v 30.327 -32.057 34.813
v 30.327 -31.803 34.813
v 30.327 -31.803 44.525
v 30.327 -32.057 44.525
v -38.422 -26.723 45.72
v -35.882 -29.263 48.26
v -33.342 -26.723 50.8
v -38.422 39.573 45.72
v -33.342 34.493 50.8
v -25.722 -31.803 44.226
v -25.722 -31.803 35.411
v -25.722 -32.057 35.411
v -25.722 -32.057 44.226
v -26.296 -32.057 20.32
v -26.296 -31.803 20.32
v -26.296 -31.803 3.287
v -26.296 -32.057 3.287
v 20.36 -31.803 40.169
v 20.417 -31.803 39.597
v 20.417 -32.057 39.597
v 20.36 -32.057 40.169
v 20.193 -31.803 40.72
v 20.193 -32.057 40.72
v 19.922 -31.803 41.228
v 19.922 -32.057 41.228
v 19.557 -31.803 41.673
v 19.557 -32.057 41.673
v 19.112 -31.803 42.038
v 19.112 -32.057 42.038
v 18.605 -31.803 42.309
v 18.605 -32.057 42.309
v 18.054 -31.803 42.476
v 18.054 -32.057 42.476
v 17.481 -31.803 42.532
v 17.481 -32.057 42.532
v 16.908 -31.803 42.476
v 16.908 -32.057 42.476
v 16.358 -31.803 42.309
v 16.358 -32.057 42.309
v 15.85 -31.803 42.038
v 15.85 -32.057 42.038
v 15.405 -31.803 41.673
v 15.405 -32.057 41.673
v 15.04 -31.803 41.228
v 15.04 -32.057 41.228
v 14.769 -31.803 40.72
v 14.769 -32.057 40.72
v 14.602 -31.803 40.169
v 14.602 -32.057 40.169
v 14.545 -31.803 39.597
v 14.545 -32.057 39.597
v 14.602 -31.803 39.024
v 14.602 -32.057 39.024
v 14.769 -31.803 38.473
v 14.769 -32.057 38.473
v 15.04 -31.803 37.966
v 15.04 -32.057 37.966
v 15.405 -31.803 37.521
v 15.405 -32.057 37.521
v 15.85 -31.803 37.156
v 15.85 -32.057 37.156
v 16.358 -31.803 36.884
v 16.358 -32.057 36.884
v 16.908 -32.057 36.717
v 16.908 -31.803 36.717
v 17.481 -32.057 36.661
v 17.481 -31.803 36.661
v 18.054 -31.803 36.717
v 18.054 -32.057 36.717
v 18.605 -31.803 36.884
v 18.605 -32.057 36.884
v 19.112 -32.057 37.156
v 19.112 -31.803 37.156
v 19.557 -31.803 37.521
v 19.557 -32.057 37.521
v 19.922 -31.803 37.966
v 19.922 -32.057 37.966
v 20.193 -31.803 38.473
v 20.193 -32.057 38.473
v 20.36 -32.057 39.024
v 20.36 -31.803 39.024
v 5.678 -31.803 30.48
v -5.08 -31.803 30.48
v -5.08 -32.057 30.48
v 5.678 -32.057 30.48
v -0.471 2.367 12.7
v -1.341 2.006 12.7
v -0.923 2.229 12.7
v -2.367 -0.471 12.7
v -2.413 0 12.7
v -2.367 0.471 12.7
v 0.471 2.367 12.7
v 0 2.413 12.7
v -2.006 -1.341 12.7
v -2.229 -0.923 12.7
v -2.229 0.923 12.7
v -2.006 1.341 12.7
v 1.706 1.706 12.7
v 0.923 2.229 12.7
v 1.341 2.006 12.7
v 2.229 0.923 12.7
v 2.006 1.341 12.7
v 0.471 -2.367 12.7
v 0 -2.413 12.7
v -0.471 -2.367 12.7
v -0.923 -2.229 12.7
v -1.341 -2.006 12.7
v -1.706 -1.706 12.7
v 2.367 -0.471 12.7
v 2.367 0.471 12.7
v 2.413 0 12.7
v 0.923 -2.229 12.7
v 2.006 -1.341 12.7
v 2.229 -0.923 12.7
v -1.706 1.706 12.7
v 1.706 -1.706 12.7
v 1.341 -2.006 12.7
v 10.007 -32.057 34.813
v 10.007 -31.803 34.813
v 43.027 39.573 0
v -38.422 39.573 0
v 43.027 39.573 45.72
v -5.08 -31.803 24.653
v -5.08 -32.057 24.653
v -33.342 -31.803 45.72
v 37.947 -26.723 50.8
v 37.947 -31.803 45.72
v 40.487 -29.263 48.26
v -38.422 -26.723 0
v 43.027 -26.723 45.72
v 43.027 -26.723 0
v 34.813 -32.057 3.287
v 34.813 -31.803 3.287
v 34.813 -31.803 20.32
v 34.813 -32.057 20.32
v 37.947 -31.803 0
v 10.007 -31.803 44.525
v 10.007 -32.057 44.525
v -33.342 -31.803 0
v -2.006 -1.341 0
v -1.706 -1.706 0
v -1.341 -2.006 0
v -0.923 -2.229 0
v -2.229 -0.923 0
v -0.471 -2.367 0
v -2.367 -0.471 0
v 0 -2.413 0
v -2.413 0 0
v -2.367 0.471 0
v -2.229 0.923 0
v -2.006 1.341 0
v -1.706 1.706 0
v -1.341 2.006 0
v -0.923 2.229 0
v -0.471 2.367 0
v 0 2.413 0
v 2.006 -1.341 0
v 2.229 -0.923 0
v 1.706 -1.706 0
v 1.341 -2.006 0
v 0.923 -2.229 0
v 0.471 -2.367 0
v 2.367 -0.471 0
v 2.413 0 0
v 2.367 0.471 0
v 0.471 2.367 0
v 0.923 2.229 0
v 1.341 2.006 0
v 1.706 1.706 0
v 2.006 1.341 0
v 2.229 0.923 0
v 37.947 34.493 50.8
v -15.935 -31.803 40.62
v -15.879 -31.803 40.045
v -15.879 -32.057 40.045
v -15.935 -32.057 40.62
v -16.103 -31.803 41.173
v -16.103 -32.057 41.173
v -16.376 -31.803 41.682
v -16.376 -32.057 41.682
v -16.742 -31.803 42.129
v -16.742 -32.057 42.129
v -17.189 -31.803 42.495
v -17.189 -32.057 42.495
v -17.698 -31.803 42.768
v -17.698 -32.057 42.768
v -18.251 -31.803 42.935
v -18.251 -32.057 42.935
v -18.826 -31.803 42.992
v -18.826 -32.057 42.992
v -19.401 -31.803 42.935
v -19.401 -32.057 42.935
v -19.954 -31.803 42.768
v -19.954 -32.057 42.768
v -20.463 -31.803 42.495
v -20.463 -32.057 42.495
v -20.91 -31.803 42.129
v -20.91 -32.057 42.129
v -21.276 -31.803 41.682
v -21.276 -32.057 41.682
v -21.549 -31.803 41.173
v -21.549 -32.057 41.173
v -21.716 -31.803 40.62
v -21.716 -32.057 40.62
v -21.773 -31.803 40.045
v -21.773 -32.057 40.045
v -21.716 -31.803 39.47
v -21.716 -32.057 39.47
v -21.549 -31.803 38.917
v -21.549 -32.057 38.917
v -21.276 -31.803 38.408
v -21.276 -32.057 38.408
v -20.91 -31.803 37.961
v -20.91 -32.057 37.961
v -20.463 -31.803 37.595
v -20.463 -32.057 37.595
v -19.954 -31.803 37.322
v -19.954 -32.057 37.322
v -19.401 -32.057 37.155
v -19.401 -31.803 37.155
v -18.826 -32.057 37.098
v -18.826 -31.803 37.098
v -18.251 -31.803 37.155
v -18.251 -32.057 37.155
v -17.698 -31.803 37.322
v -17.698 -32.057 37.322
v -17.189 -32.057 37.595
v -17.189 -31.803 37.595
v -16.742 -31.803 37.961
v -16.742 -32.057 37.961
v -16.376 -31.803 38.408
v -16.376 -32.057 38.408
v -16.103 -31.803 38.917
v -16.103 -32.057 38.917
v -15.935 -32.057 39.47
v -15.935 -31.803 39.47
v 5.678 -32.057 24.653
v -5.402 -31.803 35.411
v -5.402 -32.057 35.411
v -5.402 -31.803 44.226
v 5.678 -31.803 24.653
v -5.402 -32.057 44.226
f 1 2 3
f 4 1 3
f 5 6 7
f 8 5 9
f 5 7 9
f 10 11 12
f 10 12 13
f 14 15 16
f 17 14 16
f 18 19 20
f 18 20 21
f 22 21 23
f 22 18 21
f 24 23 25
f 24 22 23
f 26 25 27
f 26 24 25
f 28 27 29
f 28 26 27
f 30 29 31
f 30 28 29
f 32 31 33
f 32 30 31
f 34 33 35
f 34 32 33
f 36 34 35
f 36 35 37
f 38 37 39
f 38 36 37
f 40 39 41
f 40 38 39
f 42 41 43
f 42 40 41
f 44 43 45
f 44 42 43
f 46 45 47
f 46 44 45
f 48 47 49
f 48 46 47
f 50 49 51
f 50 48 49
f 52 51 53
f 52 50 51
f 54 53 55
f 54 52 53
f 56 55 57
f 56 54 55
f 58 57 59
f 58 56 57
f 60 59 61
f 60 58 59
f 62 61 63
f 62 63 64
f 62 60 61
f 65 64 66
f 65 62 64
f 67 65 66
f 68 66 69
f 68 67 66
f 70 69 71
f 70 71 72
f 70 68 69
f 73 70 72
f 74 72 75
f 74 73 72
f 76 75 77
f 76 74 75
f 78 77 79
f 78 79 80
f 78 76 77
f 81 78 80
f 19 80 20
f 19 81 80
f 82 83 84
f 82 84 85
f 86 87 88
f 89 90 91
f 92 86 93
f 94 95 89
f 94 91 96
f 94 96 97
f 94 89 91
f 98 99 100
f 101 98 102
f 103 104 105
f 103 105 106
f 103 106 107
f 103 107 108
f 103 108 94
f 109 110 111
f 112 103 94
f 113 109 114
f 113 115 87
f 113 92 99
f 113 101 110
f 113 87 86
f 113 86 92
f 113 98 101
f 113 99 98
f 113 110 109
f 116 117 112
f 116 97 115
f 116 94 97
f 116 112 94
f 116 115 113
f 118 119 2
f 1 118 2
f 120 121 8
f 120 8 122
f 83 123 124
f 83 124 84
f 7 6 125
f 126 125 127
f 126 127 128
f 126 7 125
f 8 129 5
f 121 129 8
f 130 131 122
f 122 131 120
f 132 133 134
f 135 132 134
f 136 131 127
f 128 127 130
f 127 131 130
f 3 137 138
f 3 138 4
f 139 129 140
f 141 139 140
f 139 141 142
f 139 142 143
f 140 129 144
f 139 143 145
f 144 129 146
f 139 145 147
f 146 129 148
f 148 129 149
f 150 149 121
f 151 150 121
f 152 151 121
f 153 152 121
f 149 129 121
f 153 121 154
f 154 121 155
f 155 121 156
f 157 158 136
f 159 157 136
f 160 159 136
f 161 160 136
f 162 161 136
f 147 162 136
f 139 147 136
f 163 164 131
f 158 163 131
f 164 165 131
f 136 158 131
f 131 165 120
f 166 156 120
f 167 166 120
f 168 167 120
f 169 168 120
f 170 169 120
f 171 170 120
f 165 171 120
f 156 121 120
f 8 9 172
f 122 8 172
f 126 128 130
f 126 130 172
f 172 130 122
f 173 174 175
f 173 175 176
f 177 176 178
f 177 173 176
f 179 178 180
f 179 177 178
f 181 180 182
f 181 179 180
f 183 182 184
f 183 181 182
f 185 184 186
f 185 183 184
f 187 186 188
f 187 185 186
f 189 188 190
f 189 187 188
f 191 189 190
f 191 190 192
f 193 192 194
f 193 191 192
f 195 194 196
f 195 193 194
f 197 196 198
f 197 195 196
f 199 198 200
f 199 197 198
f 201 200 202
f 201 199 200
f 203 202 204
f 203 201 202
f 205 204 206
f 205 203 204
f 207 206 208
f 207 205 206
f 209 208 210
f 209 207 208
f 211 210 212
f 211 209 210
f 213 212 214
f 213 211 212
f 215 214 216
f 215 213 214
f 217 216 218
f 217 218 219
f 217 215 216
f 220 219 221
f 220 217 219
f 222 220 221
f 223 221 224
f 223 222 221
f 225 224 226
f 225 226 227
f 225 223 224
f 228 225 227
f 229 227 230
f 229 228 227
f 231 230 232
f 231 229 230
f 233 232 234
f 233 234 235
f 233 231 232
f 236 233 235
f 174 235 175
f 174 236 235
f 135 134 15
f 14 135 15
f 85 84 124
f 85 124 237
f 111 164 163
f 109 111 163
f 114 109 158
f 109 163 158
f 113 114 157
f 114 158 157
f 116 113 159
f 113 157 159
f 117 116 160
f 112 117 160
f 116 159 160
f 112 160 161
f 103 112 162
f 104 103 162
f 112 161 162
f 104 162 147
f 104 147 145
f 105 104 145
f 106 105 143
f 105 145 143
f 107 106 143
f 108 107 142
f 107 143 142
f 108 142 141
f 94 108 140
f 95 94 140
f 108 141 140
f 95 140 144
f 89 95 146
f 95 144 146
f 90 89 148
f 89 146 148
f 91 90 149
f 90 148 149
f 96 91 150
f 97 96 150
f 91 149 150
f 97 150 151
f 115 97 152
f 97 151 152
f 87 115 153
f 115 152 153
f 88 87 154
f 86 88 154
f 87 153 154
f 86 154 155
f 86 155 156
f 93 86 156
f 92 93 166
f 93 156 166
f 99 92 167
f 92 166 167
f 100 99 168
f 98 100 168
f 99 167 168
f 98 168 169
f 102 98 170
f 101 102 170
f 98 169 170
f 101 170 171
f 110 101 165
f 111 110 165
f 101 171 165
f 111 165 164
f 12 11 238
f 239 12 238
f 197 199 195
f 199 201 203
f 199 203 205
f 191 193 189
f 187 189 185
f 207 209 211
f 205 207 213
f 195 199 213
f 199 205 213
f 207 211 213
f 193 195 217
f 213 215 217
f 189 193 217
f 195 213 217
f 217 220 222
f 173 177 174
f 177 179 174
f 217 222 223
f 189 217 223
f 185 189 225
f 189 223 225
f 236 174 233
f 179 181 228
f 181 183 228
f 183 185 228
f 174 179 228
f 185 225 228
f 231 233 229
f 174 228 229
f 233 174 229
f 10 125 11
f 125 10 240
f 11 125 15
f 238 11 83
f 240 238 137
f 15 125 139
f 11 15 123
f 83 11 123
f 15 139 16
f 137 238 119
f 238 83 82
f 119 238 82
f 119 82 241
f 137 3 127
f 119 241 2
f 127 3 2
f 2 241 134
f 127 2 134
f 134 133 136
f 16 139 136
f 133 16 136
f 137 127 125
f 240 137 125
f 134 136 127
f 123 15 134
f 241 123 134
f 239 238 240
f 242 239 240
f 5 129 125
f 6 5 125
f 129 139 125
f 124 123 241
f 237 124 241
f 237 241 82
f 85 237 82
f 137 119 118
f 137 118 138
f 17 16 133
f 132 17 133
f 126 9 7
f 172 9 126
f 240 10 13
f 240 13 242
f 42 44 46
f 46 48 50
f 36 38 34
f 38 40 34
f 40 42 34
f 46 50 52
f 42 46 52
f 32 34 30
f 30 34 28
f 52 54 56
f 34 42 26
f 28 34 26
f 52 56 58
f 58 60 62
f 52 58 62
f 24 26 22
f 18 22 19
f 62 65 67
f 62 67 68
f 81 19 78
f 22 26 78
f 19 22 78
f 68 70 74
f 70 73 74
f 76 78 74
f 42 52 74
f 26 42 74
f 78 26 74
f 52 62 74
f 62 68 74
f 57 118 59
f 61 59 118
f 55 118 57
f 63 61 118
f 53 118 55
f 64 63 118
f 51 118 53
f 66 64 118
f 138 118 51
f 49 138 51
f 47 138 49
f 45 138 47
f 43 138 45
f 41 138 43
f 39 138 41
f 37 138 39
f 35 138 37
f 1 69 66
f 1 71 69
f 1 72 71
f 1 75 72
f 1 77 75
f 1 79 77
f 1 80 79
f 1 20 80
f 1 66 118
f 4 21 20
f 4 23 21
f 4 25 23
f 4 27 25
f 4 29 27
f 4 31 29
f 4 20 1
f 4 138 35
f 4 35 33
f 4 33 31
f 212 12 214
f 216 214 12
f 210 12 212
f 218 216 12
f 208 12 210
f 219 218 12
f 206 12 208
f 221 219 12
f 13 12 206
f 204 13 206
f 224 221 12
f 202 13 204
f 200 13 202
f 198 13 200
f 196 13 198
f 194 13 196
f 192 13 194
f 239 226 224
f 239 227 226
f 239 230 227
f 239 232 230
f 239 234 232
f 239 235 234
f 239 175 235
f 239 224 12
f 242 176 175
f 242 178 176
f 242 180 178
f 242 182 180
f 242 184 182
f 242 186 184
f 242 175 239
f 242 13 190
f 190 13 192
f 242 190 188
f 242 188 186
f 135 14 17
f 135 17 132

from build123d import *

# Parameters (mm, degrees)
F0_W     = 81.449031
F0_H     = 71.375828
F1_DEPTH = 50.8
F2_W     = 20.32
F2_H     = 8.815292
F2_R     = 2.947041
F2_H_2   = 9.711764
F2_R_2   = 2.935696
F2_W_2   = 10.757647
F2_H_3   = 5.827058
F3_DEPTH = 0.254
F4_SIZE  = 5.08
F5_SIZE  = 5.08
F6_R     = 2.413
F7_DEPTH = 12.7


with BuildPart() as f1:
    # F0 (on Top) → F1 (new body)
    with BuildSketch(Plane.XY):
        with Locations((2.302446, 3.885379)):
            Rectangle(F0_W, F0_H)
    extrude(amount=F1_DEPTH)

    # F2 (on face) → F3 (join)
    with BuildSketch(Plane.XZ.offset(31.802535)):
        with Locations((-15.56207, 39.818236)):
            Rectangle(F2_W, F2_H)
        with Locations((-18.825882, 40.044982)):
            Circle(F2_R, mode=Mode.SUBTRACT)
        with Locations((20.166961, 39.668823)):
            Rectangle(F2_W, F2_H_2)
        with Locations((17.481177, 39.596712)):
            Circle(F2_R_2, mode=Mode.SUBTRACT)
        with Locations((0.298823, 27.566471)):
            Rectangle(F2_W_2, F2_H_3)
        Polygon((-22.112939, 16.584706), (-26.296471, 20.32), (-26.296471, 3.287059), (-22.877605, 7.272481), (-18.23174, 3.287059), (-15.538824, 8.516526), (-11.504705, 3.287059), (-9.26353, 8.66595), (-6.125882, 3.287059), (-4.631764, 8.217677), (0, 4.244351), (1.643529, 8.367102), (6.125882, 3.287059), (10.336007, 8.194863), (12.849411, 3.287059), (17.048708, 8.182241), (21.067059, 3.287059), (22.710588, 8.66595), (26.744705, 3.287059), (28.687059, 9.263645), (32.870589, 3.287059), (34.812941, 10.309614), (34.812941, 15.389412), (30.928233, 20.32), (29.135293, 16.584706), (25.250589, 20.32), (24.052847, 16.584706), (19.495787, 20.32), (16.43407, 16.584706), (11.877011, 20.32), (8.815294, 16.584706), (4.258235, 20.32), (2.926819, 16.584706), (-1.427469, 20.32), (-4.631764, 16.584706), (-8.986052, 20.32), (-14.215461, 16.584706), (-16.88353, 20.32), align=None)
        Polygon((-16.88353, 20.32), (-26.296471, 20.32), (-22.112939, 16.584706), align=None)
        Polygon((-8.986052, 20.32), (-16.88353, 20.32), (-14.215461, 16.584706), align=None)
        Polygon((-22.877605, 7.272481), (-26.296471, 3.287059), (-18.23174, 3.287059), align=None)
        Polygon((-1.427469, 20.32), (-8.986052, 20.32), (-4.631764, 16.584706), align=None)
        Polygon((-15.538824, 8.516526), (-18.23174, 3.287059), (-11.504705, 3.287059), align=None)
        Polygon((4.258235, 20.32), (-1.427469, 20.32), (2.926819, 16.584706), align=None)
        Polygon((-9.26353, 8.66595), (-11.504705, 3.287059), (-6.125882, 3.287059), align=None)
        Polygon((11.877011, 20.32), (4.258235, 20.32), (8.815294, 16.584706), align=None)
        Polygon((-4.631764, 8.217677), (-6.125882, 3.287059), (6.125882, 3.287059), (1.643529, 8.367102), (0, 4.244351), align=None)
        Polygon((19.495787, 20.32), (11.877011, 20.32), (16.43407, 16.584706), align=None)
        Polygon((10.336007, 8.194863), (6.125882, 3.287059), (12.849411, 3.287059), align=None)
        Polygon((25.250589, 20.32), (19.495787, 20.32), (24.052847, 16.584706), align=None)
        Polygon((17.048708, 8.182241), (12.849411, 3.287059), (21.067059, 3.287059), align=None)
        Polygon((30.928233, 20.32), (25.250589, 20.32), (29.135293, 16.584706), align=None)
        Polygon((22.710588, 8.66595), (21.067059, 3.287059), (26.744705, 3.287059), align=None)
        Polygon((34.812941, 20.32), (30.928233, 20.32), (34.812941, 15.389412), align=None)
        Polygon((28.687059, 9.263645), (26.744705, 3.287059), (32.870589, 3.287059), align=None)
        Polygon((34.812941, 10.309614), (32.870589, 3.287059), (34.812941, 3.287059), align=None)
    extrude(amount=F3_DEPTH)

    # F4
    f4_edges = [f1.edges().sort_by_distance(p)[0] for p in [
        (2.302445, -31.802535, 50.8),
        (-38.42207, -31.802535, 25.4),
        (43.026961, -31.802535, 25.4),
    ]]
    chamfer(f4_edges, length=F4_SIZE)

    # F5
    f5_edges = [f1.edges().sort_by_distance(p)[0] for p in [
        (-38.42207, 6.425379, 50.8),
        (43.026961, 6.425379, 50.8),
        (2.302445, 39.573293, 50.8),
    ]]
    chamfer(f5_edges, length=F5_SIZE)

    # F6 (on face) → F7 (cut)
    with BuildSketch(Plane(origin=(0, 0, 0), x_dir=(1, 0, 0), z_dir=(0, 0, -1))):
        Circle(F6_R)
    extrude(amount=-F7_DEPTH, mode=Mode.SUBTRACT)


solid = f1.part
